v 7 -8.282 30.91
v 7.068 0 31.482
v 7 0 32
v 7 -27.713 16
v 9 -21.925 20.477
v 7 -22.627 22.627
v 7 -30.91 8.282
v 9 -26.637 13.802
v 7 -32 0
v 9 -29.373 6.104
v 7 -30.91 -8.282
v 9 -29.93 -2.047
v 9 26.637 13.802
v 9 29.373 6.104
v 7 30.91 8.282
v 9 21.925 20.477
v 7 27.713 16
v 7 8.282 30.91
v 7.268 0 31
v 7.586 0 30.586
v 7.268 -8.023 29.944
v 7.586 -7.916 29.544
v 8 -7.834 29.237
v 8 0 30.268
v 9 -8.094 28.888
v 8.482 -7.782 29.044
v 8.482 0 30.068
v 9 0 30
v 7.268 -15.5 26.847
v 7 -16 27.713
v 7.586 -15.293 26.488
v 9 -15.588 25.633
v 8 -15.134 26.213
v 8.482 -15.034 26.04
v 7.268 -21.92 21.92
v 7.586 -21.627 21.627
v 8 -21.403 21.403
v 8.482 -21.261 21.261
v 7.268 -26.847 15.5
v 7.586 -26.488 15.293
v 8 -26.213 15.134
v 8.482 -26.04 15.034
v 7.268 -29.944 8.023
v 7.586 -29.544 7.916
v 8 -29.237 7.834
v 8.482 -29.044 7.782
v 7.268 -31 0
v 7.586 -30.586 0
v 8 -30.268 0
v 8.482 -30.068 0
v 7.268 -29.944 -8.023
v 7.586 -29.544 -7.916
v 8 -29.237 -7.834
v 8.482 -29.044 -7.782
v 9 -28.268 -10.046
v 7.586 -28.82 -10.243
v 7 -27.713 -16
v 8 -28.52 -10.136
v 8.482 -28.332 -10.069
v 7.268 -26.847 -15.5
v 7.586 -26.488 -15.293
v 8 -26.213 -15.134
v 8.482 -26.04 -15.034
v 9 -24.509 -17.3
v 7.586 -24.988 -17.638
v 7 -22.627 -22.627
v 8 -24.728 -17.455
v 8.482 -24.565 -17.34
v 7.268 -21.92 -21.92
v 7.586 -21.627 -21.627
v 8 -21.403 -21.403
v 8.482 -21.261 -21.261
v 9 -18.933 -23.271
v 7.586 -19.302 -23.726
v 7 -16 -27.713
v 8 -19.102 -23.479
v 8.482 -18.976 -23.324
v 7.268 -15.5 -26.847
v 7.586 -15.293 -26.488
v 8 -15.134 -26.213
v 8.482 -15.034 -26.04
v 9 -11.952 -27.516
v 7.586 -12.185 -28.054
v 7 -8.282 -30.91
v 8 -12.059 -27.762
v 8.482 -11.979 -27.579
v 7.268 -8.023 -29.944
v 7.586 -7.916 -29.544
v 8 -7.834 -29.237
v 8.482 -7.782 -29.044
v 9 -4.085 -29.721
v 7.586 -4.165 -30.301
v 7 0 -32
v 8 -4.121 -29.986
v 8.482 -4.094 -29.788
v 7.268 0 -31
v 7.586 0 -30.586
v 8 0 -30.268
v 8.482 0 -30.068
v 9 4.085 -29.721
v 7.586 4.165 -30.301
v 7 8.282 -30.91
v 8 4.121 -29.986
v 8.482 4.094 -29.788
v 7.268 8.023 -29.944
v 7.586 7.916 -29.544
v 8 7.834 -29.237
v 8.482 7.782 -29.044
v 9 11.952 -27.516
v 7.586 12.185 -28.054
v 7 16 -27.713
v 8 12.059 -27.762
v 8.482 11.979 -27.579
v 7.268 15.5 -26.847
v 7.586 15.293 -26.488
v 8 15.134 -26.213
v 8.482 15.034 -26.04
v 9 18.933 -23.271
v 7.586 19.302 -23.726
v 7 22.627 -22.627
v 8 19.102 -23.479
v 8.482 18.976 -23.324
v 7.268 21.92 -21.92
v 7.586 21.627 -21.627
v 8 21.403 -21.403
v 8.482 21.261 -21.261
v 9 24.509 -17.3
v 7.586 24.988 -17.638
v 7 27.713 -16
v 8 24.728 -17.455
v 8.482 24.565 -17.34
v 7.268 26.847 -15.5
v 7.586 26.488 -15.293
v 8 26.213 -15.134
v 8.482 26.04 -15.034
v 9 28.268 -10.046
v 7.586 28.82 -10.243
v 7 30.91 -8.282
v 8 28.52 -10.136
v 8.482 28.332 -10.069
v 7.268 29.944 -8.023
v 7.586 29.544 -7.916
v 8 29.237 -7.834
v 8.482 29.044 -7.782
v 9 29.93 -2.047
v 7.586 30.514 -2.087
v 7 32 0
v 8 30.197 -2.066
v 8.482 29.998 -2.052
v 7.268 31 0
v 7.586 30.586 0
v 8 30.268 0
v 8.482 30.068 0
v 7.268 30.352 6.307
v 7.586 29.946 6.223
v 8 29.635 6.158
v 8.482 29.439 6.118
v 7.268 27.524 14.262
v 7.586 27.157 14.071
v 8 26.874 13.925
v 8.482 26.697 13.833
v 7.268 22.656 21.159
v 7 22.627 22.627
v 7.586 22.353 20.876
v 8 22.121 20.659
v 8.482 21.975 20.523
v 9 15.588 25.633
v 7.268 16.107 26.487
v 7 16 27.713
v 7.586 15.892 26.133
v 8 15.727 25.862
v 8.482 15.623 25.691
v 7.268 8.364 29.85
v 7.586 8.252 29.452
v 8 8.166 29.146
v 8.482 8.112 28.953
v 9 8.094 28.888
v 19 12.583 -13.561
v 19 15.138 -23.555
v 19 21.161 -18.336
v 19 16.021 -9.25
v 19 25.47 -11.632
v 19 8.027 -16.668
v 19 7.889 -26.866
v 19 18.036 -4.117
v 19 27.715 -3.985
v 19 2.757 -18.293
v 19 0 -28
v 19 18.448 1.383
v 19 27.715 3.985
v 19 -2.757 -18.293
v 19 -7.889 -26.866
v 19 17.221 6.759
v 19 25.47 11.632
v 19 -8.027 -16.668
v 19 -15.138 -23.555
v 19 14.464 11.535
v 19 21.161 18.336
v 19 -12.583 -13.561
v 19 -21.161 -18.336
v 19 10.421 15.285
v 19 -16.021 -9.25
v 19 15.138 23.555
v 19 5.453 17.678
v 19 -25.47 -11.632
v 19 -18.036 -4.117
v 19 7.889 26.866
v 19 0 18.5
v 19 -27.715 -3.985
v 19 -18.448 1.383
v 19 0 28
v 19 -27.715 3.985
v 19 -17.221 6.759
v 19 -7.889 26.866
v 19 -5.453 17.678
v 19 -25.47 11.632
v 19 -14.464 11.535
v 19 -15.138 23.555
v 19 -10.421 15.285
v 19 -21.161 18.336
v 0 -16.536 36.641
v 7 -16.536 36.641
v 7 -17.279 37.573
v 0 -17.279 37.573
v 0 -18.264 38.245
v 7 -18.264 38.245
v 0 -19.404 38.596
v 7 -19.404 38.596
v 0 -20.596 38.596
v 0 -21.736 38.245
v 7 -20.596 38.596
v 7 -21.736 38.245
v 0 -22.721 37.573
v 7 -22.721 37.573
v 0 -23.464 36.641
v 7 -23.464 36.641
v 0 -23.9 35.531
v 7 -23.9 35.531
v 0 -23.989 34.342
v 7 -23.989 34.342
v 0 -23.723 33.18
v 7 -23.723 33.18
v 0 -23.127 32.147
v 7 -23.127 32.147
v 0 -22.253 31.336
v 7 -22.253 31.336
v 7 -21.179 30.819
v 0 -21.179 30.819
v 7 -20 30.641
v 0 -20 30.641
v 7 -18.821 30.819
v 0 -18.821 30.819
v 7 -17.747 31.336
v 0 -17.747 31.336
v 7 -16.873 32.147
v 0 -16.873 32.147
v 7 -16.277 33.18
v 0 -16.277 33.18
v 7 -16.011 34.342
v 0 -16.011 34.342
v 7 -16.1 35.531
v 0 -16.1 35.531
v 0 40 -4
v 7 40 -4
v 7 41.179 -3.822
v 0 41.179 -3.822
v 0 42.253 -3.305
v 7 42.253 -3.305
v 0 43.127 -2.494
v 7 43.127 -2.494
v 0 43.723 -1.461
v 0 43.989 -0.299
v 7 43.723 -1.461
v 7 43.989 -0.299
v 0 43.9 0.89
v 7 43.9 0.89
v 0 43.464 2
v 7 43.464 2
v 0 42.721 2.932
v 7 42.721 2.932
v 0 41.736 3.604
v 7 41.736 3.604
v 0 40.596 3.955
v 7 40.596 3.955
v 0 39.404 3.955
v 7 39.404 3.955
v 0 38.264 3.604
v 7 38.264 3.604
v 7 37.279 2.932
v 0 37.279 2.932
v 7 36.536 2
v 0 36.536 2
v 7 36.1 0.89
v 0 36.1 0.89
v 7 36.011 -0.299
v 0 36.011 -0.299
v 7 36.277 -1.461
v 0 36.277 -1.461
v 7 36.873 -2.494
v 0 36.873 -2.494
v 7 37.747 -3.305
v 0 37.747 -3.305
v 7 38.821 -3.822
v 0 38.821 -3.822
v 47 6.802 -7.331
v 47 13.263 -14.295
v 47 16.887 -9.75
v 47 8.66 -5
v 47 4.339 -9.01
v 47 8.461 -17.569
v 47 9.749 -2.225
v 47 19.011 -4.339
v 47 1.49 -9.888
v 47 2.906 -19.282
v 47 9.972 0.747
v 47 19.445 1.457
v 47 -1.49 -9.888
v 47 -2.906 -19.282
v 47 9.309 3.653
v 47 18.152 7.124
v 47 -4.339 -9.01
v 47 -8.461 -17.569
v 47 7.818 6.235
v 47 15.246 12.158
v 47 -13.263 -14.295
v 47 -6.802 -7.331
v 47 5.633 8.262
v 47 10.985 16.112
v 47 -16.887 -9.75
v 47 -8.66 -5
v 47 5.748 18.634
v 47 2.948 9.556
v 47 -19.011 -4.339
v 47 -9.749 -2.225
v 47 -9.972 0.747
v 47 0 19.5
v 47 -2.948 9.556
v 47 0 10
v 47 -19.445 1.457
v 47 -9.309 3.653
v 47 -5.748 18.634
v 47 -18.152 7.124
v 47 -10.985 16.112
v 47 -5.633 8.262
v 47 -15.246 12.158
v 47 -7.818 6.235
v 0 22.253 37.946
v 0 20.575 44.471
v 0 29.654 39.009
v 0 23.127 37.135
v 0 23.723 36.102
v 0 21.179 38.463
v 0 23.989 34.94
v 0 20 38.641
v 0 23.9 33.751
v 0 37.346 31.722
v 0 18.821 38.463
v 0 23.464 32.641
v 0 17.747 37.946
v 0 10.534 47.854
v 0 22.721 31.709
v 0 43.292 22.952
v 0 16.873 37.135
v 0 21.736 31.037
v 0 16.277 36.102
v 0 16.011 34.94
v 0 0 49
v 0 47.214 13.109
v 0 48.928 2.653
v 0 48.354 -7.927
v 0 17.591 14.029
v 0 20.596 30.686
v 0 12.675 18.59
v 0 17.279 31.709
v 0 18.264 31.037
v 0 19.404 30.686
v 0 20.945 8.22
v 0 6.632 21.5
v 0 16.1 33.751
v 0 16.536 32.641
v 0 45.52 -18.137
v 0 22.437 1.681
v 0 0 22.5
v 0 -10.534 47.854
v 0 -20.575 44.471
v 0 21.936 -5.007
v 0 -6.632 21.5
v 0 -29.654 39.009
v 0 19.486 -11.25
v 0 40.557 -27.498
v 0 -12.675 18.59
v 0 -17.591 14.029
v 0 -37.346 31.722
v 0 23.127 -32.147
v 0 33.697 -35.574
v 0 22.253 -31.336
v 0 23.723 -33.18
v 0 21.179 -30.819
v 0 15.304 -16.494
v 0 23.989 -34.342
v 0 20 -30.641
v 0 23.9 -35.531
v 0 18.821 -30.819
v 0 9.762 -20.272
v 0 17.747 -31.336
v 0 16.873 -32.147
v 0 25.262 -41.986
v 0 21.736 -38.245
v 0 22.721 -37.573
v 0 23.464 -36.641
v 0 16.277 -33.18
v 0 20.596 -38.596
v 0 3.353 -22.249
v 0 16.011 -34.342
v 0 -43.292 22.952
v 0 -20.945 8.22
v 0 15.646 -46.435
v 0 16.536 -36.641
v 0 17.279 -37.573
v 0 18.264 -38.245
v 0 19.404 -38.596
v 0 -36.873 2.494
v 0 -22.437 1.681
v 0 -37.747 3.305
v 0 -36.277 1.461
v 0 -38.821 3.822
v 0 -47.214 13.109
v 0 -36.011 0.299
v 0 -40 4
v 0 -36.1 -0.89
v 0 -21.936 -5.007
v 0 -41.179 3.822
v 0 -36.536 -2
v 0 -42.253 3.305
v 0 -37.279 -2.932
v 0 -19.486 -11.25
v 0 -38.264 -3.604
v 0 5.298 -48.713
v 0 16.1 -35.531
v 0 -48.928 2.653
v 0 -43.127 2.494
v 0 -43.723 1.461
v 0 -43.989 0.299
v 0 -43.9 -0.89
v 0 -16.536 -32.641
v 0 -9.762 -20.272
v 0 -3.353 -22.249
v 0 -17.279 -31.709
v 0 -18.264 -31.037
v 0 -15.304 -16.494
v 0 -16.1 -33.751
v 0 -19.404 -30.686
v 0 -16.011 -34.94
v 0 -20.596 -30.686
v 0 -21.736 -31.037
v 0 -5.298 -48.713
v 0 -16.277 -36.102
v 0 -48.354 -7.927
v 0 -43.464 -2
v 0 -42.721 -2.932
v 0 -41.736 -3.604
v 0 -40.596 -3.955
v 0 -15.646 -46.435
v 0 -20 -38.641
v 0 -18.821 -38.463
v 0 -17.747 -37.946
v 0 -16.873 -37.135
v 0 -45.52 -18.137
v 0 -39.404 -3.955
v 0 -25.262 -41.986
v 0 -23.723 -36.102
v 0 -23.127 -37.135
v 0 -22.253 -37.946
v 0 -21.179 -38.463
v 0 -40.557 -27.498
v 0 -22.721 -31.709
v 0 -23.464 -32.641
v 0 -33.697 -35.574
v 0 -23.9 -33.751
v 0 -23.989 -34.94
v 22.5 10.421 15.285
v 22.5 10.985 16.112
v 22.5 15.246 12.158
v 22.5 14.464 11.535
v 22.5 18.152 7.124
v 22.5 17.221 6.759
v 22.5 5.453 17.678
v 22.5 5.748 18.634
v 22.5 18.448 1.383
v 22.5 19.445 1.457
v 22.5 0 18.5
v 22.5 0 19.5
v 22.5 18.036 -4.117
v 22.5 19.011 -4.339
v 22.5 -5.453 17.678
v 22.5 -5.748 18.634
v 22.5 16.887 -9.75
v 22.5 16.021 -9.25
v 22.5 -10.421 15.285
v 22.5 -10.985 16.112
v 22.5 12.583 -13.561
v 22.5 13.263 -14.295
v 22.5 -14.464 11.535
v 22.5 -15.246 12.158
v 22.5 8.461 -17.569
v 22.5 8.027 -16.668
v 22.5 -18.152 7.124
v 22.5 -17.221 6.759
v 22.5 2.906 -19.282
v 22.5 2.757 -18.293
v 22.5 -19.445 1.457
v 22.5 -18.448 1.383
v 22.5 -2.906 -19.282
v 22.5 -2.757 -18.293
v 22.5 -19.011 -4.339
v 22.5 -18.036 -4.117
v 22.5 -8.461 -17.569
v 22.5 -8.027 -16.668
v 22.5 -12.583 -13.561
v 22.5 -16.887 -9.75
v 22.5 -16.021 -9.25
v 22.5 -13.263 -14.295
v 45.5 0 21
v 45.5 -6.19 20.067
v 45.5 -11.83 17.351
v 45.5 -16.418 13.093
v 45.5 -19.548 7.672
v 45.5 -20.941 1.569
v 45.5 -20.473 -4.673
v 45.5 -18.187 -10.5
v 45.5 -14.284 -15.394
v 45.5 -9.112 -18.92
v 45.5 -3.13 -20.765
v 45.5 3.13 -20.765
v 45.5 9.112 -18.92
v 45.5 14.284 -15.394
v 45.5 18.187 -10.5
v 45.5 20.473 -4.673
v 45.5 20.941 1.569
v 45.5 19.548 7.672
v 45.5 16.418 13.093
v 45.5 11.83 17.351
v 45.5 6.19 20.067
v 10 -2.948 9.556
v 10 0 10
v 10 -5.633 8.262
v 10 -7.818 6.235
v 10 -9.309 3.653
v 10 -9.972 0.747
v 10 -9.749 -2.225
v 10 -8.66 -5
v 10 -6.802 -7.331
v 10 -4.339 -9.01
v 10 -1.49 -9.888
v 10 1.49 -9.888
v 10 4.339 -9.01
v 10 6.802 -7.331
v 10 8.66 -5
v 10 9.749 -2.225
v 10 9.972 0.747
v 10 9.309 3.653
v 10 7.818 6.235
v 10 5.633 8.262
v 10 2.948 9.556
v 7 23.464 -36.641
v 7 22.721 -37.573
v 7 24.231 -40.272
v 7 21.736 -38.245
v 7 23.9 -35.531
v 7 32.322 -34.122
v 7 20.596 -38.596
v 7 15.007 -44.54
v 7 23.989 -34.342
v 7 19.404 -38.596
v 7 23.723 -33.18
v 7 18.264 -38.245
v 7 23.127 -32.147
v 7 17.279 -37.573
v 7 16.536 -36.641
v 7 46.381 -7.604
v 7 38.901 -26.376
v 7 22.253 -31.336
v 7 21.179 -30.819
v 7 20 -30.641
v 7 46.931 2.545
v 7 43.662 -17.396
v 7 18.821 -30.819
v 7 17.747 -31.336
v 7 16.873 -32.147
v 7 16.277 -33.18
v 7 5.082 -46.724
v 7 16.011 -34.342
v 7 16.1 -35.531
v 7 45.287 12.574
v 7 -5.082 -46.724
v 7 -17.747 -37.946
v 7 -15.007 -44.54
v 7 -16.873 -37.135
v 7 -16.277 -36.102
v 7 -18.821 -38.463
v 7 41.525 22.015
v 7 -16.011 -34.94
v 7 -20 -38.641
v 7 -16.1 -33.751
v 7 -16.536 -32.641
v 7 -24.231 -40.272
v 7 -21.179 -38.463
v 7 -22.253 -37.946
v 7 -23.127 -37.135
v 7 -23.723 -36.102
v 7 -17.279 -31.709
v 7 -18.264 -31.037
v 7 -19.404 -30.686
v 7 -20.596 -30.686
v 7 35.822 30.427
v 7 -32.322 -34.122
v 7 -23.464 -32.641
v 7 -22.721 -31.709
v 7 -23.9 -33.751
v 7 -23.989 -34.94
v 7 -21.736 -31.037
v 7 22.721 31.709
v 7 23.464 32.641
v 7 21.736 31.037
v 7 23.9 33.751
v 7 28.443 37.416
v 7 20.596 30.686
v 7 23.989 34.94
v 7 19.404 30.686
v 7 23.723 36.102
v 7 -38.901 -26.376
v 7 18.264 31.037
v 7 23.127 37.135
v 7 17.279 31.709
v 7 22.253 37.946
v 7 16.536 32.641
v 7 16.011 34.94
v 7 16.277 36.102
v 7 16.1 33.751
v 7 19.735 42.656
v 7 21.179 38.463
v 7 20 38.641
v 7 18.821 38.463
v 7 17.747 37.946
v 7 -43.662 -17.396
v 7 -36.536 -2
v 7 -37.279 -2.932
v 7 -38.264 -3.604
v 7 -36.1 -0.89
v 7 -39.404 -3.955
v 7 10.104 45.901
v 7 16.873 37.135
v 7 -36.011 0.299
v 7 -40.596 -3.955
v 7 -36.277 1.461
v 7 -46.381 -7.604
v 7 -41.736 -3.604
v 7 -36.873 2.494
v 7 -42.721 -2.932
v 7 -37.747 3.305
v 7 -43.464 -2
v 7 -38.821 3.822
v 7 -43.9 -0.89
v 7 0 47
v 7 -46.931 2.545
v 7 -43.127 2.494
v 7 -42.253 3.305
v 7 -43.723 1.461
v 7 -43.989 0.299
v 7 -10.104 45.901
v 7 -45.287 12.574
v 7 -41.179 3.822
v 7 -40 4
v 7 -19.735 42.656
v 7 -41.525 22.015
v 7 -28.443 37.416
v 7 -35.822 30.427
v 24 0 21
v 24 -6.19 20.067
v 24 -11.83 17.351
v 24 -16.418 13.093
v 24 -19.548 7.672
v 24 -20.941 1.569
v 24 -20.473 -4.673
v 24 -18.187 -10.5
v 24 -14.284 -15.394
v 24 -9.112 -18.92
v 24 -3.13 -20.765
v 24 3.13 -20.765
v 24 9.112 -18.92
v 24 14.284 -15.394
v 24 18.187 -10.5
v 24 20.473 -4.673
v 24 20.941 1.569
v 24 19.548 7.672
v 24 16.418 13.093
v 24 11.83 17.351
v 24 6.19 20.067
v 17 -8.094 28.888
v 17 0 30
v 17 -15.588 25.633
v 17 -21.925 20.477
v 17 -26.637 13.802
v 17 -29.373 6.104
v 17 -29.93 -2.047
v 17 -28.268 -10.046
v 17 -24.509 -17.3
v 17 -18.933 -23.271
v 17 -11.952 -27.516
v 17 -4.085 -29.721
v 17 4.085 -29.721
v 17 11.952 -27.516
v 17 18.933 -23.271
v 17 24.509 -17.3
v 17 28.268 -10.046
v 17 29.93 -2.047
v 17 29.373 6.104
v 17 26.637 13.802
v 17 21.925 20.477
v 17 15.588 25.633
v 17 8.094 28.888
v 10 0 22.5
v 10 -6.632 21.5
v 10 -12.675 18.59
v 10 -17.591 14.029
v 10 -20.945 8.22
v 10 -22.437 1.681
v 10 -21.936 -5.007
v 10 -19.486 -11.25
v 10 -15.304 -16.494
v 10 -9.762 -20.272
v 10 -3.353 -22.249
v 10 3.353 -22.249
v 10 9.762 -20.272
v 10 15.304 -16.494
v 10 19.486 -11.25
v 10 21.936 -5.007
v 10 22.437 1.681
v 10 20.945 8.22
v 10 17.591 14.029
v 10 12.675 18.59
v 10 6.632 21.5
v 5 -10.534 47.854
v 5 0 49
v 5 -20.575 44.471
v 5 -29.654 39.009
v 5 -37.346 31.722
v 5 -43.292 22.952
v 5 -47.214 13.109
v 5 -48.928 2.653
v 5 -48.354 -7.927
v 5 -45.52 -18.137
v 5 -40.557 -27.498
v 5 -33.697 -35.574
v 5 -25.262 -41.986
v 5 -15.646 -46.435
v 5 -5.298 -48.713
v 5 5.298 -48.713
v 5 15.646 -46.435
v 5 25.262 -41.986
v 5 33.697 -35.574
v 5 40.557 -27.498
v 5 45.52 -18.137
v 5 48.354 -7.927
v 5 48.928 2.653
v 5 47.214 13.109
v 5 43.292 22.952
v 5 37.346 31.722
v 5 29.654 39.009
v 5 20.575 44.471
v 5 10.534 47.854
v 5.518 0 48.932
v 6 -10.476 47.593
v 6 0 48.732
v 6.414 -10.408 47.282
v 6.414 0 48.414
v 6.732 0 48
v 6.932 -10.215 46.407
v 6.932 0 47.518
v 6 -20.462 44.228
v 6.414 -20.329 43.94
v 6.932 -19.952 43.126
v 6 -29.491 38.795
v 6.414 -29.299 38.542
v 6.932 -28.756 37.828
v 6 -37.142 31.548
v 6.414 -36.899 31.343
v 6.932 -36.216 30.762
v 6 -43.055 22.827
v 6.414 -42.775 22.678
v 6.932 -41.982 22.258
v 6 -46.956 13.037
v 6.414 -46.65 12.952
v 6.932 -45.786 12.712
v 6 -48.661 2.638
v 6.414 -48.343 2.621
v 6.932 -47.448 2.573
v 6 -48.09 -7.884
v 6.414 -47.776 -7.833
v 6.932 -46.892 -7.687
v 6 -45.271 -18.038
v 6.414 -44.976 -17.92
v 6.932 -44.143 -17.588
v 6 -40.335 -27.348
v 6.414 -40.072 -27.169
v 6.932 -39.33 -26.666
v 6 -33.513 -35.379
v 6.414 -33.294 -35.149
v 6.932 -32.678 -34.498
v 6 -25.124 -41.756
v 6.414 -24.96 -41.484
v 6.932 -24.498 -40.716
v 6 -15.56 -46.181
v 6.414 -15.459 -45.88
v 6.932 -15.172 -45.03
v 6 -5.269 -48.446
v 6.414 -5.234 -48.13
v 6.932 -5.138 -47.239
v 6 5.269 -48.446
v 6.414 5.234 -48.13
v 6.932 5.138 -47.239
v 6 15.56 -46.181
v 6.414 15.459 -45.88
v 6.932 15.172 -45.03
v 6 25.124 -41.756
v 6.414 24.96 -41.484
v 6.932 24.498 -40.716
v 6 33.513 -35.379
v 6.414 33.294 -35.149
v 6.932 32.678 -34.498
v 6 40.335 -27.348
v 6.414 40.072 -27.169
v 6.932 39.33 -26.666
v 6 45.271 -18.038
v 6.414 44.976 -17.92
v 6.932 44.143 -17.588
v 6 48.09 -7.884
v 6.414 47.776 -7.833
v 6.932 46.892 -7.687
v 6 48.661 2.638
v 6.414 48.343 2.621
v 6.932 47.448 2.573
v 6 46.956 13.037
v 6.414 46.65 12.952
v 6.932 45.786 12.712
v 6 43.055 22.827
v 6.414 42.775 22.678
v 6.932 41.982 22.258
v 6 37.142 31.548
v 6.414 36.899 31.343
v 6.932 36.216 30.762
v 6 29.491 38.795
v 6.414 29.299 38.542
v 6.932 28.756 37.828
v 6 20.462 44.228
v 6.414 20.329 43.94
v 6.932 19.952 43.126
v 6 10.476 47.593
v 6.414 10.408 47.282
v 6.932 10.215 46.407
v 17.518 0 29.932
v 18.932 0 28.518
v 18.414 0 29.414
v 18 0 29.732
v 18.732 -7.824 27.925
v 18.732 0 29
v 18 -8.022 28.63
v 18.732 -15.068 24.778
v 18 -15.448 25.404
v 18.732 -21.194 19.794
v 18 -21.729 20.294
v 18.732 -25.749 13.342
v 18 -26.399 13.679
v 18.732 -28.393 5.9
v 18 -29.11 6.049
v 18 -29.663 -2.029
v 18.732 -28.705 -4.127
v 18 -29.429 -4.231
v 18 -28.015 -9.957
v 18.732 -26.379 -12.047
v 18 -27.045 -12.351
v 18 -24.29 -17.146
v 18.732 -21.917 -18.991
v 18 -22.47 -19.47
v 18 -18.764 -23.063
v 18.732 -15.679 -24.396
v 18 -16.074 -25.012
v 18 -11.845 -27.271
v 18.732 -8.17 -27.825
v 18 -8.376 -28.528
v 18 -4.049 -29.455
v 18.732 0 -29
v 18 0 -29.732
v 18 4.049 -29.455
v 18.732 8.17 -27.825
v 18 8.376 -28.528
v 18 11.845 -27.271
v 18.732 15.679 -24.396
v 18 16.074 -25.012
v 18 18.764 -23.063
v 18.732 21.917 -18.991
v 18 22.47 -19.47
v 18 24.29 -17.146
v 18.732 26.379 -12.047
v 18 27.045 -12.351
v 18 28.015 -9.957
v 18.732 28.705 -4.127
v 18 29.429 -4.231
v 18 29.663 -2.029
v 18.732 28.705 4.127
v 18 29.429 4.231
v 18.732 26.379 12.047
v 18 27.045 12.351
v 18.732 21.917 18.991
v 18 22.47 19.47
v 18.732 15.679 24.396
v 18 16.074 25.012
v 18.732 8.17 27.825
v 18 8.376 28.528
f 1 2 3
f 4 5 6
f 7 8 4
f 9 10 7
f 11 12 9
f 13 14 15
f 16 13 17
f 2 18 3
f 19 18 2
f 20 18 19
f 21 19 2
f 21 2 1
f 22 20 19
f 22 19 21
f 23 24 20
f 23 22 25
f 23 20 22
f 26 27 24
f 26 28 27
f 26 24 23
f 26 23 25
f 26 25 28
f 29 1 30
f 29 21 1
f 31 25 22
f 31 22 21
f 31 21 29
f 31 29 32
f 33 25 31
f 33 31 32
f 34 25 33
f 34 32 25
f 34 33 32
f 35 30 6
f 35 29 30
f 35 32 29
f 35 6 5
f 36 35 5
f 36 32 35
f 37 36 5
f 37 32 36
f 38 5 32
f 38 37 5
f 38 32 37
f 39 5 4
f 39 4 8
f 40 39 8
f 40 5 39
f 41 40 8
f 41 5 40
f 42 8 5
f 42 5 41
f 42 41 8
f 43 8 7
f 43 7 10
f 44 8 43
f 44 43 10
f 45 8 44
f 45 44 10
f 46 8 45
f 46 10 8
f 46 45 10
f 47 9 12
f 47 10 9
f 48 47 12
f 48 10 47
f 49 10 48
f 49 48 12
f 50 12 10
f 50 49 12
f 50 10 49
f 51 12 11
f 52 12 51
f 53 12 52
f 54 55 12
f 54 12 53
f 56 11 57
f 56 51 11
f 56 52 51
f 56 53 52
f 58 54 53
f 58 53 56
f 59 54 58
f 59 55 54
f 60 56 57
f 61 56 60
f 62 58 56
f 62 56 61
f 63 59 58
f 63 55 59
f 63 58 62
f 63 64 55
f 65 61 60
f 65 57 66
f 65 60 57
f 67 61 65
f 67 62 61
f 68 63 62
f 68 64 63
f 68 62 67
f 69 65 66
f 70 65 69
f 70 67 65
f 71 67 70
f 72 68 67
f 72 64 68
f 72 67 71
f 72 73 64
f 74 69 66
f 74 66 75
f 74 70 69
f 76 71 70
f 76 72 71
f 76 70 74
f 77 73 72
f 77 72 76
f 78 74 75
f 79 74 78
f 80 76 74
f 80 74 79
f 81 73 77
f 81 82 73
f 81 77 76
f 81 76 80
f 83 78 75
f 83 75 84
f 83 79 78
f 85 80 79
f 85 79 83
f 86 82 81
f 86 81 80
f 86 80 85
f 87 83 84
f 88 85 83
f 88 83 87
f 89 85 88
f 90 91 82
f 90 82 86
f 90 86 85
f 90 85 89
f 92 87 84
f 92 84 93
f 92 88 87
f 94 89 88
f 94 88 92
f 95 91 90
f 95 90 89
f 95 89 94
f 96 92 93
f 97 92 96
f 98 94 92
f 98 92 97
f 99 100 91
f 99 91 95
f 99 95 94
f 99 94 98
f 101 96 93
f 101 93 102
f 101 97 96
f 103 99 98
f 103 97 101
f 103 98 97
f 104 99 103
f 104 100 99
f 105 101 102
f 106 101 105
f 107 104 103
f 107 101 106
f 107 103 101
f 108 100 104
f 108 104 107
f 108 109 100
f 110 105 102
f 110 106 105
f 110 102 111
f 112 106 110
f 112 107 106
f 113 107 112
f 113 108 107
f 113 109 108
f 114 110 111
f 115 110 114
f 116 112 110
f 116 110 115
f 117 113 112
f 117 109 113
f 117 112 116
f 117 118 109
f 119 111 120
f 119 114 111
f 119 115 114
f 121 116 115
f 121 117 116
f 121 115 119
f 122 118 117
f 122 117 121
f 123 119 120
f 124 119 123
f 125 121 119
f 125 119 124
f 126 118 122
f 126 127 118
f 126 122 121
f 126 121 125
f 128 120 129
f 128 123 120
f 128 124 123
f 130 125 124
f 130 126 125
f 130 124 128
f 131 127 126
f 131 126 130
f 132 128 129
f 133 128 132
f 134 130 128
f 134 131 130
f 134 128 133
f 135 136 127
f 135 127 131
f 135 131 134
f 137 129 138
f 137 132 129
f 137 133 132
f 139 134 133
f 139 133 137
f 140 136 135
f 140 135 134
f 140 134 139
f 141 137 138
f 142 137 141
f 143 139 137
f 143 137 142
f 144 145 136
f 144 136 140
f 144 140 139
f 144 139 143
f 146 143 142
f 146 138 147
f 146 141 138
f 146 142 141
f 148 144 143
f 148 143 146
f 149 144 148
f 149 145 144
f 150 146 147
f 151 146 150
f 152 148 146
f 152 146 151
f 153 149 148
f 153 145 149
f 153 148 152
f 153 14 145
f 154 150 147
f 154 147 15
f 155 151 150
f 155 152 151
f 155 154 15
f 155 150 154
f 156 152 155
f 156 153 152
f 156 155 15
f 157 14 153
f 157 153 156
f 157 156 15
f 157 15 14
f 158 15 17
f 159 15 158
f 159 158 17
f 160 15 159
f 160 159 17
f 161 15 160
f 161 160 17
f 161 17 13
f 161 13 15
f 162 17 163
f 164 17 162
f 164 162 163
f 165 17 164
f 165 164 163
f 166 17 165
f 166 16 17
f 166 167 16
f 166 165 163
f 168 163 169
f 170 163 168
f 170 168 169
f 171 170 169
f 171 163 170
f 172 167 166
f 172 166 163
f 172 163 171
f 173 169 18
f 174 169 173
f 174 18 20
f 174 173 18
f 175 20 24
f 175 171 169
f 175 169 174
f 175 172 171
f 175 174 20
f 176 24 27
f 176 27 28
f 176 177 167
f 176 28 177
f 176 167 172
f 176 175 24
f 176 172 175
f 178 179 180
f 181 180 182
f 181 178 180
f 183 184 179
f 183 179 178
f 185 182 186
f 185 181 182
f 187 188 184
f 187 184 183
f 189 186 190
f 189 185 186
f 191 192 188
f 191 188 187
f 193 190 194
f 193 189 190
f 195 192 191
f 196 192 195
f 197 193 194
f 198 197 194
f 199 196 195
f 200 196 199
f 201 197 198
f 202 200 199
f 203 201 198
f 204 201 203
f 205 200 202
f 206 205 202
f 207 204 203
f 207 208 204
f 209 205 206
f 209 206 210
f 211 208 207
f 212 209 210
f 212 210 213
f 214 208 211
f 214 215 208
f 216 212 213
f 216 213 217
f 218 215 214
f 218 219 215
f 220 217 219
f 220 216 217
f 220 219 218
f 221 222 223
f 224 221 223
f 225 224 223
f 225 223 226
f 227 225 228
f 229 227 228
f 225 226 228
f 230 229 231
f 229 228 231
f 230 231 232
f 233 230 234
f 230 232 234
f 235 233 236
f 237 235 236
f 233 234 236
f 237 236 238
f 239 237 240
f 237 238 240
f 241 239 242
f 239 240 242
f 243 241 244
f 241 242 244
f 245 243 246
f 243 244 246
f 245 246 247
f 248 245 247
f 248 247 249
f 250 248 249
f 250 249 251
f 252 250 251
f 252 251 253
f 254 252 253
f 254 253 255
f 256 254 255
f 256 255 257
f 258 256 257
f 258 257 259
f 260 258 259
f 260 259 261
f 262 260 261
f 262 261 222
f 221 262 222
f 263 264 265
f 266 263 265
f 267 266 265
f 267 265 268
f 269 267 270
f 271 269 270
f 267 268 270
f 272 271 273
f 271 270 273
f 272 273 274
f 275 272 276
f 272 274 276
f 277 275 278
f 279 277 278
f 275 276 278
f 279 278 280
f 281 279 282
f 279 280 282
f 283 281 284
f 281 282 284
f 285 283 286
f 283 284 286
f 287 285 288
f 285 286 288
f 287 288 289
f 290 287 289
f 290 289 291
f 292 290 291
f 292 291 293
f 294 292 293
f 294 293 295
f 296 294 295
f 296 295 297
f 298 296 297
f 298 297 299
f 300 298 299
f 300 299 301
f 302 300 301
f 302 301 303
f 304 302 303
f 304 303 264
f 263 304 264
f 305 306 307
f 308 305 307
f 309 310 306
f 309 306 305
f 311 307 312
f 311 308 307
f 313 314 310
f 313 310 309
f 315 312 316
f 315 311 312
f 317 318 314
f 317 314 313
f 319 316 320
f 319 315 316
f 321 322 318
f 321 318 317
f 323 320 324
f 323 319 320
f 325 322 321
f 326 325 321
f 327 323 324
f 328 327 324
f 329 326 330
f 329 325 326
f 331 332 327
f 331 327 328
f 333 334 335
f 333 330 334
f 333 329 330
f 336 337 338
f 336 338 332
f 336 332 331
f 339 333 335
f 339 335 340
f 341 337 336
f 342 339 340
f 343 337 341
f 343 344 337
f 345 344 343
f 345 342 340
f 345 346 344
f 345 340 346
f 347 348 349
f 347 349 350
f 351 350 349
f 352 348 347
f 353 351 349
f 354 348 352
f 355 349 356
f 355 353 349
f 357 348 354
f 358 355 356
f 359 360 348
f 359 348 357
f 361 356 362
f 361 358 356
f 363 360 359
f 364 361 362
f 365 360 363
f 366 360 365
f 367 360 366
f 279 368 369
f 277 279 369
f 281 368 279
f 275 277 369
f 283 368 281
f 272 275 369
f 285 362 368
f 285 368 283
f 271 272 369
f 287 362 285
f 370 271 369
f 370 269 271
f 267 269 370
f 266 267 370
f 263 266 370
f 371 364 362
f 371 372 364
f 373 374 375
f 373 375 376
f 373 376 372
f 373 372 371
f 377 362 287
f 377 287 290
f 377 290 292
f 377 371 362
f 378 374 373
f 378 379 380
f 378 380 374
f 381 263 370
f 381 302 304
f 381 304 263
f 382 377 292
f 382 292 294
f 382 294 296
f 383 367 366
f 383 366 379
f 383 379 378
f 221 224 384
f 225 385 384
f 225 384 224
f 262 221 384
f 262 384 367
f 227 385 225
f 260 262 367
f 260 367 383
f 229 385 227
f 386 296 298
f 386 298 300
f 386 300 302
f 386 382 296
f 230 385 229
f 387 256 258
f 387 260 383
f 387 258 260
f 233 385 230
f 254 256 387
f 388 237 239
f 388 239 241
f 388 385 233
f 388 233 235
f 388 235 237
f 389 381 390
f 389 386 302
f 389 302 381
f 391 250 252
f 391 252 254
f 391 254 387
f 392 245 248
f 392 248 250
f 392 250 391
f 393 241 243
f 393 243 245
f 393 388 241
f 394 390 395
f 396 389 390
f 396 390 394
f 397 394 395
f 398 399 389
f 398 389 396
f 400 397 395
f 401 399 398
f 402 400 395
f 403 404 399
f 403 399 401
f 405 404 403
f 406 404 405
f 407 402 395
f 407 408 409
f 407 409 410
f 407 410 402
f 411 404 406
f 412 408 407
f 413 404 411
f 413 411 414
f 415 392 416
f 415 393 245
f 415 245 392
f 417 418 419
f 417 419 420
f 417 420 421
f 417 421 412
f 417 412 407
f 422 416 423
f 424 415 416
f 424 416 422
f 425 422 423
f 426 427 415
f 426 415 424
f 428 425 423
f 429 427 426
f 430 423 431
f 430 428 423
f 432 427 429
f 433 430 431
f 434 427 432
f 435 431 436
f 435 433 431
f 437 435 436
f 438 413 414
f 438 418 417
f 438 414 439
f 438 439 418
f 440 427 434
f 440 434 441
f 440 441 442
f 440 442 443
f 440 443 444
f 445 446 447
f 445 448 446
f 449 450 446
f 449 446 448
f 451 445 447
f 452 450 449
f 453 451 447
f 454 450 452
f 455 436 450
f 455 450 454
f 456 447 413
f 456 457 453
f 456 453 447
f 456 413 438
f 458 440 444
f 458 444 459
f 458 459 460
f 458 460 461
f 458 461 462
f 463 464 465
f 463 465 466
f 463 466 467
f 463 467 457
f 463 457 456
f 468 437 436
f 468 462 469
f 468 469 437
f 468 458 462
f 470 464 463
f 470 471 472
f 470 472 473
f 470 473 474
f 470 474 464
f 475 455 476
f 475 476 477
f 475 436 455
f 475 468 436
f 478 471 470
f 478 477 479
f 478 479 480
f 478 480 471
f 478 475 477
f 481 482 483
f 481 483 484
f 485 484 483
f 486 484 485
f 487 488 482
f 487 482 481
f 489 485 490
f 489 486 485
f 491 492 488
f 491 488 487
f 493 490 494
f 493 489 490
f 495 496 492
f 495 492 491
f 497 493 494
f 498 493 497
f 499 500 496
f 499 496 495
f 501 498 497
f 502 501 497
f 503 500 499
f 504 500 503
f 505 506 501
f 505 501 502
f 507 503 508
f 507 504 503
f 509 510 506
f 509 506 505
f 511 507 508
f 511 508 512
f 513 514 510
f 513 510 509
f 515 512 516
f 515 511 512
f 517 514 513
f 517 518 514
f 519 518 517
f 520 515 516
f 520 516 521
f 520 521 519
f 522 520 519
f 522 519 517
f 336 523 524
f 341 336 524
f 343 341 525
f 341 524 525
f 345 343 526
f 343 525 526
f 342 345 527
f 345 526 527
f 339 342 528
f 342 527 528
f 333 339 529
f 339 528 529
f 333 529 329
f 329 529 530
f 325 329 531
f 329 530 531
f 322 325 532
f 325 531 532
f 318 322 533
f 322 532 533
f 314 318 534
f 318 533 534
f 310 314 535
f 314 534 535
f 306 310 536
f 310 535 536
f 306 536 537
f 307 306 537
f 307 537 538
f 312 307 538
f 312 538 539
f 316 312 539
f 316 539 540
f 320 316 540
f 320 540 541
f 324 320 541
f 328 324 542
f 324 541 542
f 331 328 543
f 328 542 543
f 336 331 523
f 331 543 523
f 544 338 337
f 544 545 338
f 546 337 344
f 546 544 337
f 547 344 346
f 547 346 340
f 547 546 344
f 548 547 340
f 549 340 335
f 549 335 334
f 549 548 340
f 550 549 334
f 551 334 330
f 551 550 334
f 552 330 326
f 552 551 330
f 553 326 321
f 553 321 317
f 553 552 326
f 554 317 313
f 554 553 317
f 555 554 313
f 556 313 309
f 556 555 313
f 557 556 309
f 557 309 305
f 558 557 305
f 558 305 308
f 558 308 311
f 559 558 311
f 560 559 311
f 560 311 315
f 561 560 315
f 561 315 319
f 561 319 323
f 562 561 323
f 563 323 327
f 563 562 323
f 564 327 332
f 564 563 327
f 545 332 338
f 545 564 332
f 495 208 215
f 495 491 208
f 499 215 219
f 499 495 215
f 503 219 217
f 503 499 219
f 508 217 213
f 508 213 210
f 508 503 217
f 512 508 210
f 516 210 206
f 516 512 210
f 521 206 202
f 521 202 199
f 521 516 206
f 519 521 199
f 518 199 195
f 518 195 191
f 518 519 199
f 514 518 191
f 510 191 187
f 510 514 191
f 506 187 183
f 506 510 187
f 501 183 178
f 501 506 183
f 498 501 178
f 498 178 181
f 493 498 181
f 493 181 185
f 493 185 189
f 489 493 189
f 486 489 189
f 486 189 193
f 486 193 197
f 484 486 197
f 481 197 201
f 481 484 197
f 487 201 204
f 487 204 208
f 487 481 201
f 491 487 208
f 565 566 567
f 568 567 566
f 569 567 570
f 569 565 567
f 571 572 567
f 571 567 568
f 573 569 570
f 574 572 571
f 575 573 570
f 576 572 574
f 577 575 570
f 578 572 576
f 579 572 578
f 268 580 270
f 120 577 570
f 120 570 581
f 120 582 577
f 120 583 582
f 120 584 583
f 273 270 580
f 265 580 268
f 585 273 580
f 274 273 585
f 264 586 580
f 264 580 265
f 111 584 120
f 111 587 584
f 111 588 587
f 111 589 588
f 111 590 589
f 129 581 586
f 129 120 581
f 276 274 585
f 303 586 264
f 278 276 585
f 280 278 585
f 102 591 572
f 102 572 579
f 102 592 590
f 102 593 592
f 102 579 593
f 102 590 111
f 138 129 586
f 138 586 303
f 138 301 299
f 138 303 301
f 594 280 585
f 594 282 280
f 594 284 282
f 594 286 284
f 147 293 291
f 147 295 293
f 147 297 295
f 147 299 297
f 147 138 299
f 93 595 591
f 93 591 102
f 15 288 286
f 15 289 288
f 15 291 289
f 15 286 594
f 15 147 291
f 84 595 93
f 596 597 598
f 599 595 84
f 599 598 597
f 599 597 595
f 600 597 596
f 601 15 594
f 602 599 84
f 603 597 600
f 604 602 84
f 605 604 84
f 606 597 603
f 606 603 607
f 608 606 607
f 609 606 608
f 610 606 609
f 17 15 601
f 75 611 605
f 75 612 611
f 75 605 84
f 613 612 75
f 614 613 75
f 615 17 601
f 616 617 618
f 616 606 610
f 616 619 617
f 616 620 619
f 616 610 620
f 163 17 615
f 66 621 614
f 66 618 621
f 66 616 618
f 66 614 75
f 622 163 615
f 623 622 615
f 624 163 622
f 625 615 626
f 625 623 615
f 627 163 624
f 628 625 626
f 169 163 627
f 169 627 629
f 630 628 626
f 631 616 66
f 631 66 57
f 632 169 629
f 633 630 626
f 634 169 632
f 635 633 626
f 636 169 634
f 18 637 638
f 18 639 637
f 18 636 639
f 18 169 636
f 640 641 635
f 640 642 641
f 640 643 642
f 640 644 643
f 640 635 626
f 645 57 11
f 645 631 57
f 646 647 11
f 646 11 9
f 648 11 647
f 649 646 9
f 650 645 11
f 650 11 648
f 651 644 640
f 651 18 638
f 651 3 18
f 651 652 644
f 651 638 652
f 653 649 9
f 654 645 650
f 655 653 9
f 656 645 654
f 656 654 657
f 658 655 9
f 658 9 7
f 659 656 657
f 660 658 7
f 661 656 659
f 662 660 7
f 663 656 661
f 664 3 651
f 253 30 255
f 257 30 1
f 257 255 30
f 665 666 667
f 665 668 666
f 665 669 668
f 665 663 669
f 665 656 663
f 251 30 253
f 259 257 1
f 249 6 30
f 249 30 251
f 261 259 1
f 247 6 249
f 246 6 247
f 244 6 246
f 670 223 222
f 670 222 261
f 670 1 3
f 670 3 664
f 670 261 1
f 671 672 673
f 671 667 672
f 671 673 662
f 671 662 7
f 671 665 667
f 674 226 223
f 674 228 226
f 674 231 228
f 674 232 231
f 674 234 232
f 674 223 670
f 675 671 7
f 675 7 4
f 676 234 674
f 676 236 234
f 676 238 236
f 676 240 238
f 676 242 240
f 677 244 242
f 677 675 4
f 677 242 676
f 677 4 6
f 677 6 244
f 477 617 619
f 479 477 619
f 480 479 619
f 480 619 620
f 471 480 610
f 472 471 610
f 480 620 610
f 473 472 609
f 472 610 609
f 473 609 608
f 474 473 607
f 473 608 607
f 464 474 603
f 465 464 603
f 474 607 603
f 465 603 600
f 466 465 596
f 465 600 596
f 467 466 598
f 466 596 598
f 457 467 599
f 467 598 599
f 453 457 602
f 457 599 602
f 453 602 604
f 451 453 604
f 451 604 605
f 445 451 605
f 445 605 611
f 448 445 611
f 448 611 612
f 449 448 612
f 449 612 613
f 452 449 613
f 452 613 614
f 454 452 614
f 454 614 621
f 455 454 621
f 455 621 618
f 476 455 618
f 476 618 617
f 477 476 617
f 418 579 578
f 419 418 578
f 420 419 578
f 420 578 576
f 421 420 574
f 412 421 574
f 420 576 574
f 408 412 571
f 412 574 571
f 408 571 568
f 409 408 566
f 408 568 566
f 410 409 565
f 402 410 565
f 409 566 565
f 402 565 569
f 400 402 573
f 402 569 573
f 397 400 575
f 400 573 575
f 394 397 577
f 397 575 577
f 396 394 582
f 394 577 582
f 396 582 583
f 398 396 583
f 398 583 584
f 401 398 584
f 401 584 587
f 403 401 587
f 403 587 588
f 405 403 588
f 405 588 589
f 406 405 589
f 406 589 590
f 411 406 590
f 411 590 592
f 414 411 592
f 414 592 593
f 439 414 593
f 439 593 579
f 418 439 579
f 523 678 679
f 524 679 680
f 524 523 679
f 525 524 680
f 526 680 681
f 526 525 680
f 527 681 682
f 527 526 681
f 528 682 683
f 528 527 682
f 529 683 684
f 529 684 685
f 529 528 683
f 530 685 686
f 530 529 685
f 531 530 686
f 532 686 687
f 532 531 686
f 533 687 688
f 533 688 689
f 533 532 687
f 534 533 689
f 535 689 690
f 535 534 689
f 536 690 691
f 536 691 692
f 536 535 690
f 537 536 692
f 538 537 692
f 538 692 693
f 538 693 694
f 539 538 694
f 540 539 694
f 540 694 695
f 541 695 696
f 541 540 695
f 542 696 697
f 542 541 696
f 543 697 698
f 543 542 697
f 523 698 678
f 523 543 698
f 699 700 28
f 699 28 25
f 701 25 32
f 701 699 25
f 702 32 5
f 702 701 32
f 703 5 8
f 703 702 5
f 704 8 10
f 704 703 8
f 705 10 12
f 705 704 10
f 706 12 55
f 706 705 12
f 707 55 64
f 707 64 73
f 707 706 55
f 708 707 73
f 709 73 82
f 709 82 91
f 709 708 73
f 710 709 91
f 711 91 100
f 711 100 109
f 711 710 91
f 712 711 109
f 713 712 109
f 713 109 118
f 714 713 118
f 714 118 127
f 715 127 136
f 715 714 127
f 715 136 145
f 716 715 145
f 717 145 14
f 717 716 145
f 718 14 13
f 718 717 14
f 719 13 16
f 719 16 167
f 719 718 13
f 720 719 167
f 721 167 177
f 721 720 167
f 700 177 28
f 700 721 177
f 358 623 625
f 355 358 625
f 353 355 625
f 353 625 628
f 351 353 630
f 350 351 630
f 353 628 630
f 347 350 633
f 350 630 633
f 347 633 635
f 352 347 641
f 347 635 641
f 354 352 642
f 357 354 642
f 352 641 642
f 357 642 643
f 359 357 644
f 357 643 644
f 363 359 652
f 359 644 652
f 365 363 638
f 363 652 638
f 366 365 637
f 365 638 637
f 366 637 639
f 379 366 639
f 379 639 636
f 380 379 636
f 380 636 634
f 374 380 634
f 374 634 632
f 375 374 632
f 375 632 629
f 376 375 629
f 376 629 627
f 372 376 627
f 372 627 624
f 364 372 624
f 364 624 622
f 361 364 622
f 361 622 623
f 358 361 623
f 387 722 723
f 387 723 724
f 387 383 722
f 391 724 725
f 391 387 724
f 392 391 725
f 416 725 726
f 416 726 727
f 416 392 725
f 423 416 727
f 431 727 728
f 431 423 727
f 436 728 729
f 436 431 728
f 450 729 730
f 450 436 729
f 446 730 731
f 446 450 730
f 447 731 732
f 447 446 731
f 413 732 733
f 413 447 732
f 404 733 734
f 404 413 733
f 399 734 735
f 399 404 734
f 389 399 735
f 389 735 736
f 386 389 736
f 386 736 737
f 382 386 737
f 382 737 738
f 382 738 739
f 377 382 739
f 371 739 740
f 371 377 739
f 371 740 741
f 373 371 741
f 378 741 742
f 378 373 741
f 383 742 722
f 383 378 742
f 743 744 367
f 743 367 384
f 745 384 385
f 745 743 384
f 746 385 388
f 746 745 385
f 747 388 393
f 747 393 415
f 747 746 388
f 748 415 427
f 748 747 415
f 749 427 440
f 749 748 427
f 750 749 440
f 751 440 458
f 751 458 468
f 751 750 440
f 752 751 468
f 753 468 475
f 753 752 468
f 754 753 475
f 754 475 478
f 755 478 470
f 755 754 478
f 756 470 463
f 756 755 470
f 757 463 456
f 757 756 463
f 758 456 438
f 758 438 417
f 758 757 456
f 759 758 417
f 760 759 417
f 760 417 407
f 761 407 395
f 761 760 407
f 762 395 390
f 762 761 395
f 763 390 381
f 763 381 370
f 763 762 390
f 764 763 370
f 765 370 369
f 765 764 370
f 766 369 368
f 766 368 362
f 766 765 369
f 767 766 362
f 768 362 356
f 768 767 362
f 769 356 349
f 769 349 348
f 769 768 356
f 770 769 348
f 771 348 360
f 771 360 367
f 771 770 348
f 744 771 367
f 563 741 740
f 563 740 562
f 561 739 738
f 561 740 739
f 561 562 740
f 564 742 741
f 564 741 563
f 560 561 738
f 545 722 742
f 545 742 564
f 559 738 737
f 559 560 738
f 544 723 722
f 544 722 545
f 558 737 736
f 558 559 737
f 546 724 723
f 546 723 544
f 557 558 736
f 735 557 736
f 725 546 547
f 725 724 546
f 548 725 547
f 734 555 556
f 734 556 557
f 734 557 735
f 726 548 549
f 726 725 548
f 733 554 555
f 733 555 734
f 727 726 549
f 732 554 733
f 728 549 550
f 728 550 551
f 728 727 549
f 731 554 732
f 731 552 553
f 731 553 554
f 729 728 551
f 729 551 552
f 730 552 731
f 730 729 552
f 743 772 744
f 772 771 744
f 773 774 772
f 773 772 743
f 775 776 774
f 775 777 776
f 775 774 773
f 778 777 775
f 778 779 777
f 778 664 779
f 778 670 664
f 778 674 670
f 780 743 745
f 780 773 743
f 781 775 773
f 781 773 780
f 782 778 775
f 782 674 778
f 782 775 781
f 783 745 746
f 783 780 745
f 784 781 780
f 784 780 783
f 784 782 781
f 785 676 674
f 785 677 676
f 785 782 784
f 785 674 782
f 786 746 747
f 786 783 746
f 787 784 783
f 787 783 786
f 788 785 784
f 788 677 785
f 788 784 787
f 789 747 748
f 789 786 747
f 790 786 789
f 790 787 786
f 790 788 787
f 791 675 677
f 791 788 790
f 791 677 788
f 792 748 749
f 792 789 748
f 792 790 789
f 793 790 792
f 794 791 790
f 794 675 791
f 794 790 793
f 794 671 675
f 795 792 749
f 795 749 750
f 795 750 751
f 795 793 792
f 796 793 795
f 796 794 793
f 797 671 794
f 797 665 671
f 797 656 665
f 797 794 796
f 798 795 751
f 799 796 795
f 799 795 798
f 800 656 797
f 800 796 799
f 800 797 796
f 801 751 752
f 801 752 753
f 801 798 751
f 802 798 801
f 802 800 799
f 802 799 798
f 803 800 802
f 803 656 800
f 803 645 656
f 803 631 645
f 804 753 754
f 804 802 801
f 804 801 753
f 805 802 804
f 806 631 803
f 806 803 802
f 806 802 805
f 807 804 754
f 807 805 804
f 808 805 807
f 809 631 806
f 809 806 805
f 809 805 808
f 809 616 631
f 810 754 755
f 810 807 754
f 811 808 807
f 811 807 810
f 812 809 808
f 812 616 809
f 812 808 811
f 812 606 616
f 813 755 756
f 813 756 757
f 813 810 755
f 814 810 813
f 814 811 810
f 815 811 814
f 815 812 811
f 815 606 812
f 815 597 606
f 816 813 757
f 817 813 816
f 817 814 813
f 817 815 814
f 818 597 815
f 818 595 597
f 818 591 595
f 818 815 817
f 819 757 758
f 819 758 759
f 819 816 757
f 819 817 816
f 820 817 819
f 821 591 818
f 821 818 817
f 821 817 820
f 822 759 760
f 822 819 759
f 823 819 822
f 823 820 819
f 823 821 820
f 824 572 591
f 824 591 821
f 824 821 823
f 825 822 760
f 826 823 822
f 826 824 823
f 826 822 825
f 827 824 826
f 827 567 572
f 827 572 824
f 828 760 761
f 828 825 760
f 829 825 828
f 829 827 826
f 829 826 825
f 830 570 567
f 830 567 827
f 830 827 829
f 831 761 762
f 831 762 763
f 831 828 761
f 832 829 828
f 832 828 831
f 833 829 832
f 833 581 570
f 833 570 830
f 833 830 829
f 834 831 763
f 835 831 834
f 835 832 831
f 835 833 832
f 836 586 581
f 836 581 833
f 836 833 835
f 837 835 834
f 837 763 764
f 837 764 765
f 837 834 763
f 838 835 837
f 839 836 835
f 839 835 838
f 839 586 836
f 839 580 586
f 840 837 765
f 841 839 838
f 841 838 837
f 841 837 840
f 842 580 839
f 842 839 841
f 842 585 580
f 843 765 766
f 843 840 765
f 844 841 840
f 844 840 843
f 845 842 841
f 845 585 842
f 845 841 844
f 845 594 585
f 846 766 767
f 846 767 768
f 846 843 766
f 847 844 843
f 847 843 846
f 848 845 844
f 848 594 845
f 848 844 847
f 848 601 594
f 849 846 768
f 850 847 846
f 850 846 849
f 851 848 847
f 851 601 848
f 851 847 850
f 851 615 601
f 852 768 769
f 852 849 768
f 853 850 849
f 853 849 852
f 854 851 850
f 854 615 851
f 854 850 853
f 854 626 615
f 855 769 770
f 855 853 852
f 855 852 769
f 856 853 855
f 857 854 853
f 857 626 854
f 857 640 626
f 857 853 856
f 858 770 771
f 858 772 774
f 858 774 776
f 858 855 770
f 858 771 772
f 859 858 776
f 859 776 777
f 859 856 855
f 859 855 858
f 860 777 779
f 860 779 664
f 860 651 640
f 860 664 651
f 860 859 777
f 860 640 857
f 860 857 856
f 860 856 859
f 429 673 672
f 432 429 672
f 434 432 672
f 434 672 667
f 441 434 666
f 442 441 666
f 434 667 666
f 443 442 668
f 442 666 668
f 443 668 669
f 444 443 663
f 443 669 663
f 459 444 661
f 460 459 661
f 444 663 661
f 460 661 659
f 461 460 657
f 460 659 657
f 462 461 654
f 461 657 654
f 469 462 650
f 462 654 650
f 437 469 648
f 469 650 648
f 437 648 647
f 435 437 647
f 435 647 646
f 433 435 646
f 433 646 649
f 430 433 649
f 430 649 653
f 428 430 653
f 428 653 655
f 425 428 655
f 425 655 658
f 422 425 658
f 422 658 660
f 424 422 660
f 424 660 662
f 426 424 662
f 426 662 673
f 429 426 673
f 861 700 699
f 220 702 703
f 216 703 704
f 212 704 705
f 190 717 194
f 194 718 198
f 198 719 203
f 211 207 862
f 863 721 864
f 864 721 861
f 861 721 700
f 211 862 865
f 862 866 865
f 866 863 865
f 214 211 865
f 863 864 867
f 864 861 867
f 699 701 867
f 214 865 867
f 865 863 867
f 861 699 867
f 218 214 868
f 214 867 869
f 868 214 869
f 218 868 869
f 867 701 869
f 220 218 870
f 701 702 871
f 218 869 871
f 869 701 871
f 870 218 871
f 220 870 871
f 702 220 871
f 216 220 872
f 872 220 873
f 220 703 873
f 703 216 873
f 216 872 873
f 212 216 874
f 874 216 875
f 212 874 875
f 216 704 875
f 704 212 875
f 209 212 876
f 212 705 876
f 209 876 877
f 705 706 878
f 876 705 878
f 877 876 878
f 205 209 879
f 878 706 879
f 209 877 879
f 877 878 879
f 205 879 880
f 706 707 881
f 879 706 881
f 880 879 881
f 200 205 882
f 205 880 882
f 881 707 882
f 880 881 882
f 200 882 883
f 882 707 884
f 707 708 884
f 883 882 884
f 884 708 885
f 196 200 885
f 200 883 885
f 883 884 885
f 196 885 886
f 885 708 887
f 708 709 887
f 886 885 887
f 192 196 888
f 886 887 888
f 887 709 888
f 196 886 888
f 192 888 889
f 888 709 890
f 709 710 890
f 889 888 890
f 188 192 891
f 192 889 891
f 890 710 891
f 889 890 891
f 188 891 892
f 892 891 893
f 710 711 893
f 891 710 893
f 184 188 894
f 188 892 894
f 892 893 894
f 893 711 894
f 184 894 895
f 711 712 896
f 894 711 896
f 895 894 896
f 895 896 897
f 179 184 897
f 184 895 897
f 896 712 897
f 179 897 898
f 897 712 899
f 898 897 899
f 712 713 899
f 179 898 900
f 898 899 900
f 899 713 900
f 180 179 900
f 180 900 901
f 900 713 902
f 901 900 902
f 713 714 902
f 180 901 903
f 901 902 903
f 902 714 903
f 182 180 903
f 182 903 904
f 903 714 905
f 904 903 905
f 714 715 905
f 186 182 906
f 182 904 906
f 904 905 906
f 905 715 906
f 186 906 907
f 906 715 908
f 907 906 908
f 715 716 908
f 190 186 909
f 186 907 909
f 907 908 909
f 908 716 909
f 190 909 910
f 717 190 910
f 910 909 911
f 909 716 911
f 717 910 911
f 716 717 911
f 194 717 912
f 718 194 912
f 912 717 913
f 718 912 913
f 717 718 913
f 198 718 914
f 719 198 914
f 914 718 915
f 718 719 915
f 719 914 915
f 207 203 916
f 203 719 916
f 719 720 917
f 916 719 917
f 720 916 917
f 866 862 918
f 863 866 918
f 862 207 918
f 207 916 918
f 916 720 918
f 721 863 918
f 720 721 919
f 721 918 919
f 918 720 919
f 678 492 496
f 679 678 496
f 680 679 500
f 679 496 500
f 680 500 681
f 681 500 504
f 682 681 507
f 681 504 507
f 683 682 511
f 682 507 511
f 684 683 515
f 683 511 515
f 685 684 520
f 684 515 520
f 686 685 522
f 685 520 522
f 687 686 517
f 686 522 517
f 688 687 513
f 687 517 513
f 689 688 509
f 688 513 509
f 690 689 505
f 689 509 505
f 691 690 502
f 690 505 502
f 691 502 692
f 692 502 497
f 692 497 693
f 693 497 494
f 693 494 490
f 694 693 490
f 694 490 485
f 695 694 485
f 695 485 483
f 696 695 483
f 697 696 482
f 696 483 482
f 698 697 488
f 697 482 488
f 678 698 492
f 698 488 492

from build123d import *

# Parameters (mm, degrees)
CHAMFER_1_SIZE           = 1.5
SKETCH_3_R               = 4
CUT_EXTRUDE_1_DEPTH      = 81.012499024
PATTERN_CIRCULAR_1_COUNT = 6
FILLET_1_R               = 2


with BuildPart() as part:
    # 草圖1 → 旋轉1 (revolve)
    with BuildSketch(Plane.XY, mode=Mode.PRIVATE) as revolve_1_sk:
        Polygon((0, 0), (0, 49), (7, 49), (7, 30), (19, 30), (19, 18.5), (22.5, 18.5), (22.5, 21), (47, 21), (47, 0), align=None)
    revolve(revolve_1_sk.sketch.rotate(Axis((0, 0, 0), (1, 0, 0)), 90), axis=Axis((0, 0, 0), (1, 0, 0)))

    # 草圖2 → 除料-旋轉1 (revolve, cut)
    with BuildSketch(Plane.XY, mode=Mode.PRIVATE) as cut_revolve_1_sk:
        Polygon((47, 0), (47, 10), (10, 10), (10, 22.5), (0, 22.5), (0, 0), align=None)
    revolve(cut_revolve_1_sk.sketch.rotate(Axis((0, 0, 0), (1, 0, 0)), 90), axis=Axis((0, 0, 0), (1, 0, 0)), mode=Mode.SUBTRACT)

    # 導角1
    chamfer_1_edges = [part.edges().sort_by_distance(p)[0] for p in [
        (47, 0, -21),
        (22.5, 0, -21),
    ]]
    chamfer(chamfer_1_edges, length=CHAMFER_1_SIZE)

    # 草圖3 → 伸長1 (cut, through all)
    with BuildSketch(Plane(origin=(7, 0, 0), x_dir=(0, 0, -1), z_dir=(1, 0, 0))):
        with Locations((0, 40)):
            Circle(SKETCH_3_R)
    cut_extrude_1 = extrude(amount=-CUT_EXTRUDE_1_DEPTH, mode=Mode.SUBTRACT)

    # 環狀複製排列1: 伸長1 ×6 about axis
    pattern_circular_1_axis = Axis((0, 0, 0), (1, 0, 0))
    for i in range(1, PATTERN_CIRCULAR_1_COUNT):
        add(cut_extrude_1.rotate(pattern_circular_1_axis, i * 360 / PATTERN_CIRCULAR_1_COUNT), mode=Mode.SUBTRACT)

    # 圓角1
    fillet_1_edges = [part.edges().sort_by_distance(p)[0] for p in [
        (7, 0, -49),
        (19, 0, -30),
        (7, 0, -30),
    ]]
    fillet(fillet_1_edges, radius=FILLET_1_R)


solid = part.part
